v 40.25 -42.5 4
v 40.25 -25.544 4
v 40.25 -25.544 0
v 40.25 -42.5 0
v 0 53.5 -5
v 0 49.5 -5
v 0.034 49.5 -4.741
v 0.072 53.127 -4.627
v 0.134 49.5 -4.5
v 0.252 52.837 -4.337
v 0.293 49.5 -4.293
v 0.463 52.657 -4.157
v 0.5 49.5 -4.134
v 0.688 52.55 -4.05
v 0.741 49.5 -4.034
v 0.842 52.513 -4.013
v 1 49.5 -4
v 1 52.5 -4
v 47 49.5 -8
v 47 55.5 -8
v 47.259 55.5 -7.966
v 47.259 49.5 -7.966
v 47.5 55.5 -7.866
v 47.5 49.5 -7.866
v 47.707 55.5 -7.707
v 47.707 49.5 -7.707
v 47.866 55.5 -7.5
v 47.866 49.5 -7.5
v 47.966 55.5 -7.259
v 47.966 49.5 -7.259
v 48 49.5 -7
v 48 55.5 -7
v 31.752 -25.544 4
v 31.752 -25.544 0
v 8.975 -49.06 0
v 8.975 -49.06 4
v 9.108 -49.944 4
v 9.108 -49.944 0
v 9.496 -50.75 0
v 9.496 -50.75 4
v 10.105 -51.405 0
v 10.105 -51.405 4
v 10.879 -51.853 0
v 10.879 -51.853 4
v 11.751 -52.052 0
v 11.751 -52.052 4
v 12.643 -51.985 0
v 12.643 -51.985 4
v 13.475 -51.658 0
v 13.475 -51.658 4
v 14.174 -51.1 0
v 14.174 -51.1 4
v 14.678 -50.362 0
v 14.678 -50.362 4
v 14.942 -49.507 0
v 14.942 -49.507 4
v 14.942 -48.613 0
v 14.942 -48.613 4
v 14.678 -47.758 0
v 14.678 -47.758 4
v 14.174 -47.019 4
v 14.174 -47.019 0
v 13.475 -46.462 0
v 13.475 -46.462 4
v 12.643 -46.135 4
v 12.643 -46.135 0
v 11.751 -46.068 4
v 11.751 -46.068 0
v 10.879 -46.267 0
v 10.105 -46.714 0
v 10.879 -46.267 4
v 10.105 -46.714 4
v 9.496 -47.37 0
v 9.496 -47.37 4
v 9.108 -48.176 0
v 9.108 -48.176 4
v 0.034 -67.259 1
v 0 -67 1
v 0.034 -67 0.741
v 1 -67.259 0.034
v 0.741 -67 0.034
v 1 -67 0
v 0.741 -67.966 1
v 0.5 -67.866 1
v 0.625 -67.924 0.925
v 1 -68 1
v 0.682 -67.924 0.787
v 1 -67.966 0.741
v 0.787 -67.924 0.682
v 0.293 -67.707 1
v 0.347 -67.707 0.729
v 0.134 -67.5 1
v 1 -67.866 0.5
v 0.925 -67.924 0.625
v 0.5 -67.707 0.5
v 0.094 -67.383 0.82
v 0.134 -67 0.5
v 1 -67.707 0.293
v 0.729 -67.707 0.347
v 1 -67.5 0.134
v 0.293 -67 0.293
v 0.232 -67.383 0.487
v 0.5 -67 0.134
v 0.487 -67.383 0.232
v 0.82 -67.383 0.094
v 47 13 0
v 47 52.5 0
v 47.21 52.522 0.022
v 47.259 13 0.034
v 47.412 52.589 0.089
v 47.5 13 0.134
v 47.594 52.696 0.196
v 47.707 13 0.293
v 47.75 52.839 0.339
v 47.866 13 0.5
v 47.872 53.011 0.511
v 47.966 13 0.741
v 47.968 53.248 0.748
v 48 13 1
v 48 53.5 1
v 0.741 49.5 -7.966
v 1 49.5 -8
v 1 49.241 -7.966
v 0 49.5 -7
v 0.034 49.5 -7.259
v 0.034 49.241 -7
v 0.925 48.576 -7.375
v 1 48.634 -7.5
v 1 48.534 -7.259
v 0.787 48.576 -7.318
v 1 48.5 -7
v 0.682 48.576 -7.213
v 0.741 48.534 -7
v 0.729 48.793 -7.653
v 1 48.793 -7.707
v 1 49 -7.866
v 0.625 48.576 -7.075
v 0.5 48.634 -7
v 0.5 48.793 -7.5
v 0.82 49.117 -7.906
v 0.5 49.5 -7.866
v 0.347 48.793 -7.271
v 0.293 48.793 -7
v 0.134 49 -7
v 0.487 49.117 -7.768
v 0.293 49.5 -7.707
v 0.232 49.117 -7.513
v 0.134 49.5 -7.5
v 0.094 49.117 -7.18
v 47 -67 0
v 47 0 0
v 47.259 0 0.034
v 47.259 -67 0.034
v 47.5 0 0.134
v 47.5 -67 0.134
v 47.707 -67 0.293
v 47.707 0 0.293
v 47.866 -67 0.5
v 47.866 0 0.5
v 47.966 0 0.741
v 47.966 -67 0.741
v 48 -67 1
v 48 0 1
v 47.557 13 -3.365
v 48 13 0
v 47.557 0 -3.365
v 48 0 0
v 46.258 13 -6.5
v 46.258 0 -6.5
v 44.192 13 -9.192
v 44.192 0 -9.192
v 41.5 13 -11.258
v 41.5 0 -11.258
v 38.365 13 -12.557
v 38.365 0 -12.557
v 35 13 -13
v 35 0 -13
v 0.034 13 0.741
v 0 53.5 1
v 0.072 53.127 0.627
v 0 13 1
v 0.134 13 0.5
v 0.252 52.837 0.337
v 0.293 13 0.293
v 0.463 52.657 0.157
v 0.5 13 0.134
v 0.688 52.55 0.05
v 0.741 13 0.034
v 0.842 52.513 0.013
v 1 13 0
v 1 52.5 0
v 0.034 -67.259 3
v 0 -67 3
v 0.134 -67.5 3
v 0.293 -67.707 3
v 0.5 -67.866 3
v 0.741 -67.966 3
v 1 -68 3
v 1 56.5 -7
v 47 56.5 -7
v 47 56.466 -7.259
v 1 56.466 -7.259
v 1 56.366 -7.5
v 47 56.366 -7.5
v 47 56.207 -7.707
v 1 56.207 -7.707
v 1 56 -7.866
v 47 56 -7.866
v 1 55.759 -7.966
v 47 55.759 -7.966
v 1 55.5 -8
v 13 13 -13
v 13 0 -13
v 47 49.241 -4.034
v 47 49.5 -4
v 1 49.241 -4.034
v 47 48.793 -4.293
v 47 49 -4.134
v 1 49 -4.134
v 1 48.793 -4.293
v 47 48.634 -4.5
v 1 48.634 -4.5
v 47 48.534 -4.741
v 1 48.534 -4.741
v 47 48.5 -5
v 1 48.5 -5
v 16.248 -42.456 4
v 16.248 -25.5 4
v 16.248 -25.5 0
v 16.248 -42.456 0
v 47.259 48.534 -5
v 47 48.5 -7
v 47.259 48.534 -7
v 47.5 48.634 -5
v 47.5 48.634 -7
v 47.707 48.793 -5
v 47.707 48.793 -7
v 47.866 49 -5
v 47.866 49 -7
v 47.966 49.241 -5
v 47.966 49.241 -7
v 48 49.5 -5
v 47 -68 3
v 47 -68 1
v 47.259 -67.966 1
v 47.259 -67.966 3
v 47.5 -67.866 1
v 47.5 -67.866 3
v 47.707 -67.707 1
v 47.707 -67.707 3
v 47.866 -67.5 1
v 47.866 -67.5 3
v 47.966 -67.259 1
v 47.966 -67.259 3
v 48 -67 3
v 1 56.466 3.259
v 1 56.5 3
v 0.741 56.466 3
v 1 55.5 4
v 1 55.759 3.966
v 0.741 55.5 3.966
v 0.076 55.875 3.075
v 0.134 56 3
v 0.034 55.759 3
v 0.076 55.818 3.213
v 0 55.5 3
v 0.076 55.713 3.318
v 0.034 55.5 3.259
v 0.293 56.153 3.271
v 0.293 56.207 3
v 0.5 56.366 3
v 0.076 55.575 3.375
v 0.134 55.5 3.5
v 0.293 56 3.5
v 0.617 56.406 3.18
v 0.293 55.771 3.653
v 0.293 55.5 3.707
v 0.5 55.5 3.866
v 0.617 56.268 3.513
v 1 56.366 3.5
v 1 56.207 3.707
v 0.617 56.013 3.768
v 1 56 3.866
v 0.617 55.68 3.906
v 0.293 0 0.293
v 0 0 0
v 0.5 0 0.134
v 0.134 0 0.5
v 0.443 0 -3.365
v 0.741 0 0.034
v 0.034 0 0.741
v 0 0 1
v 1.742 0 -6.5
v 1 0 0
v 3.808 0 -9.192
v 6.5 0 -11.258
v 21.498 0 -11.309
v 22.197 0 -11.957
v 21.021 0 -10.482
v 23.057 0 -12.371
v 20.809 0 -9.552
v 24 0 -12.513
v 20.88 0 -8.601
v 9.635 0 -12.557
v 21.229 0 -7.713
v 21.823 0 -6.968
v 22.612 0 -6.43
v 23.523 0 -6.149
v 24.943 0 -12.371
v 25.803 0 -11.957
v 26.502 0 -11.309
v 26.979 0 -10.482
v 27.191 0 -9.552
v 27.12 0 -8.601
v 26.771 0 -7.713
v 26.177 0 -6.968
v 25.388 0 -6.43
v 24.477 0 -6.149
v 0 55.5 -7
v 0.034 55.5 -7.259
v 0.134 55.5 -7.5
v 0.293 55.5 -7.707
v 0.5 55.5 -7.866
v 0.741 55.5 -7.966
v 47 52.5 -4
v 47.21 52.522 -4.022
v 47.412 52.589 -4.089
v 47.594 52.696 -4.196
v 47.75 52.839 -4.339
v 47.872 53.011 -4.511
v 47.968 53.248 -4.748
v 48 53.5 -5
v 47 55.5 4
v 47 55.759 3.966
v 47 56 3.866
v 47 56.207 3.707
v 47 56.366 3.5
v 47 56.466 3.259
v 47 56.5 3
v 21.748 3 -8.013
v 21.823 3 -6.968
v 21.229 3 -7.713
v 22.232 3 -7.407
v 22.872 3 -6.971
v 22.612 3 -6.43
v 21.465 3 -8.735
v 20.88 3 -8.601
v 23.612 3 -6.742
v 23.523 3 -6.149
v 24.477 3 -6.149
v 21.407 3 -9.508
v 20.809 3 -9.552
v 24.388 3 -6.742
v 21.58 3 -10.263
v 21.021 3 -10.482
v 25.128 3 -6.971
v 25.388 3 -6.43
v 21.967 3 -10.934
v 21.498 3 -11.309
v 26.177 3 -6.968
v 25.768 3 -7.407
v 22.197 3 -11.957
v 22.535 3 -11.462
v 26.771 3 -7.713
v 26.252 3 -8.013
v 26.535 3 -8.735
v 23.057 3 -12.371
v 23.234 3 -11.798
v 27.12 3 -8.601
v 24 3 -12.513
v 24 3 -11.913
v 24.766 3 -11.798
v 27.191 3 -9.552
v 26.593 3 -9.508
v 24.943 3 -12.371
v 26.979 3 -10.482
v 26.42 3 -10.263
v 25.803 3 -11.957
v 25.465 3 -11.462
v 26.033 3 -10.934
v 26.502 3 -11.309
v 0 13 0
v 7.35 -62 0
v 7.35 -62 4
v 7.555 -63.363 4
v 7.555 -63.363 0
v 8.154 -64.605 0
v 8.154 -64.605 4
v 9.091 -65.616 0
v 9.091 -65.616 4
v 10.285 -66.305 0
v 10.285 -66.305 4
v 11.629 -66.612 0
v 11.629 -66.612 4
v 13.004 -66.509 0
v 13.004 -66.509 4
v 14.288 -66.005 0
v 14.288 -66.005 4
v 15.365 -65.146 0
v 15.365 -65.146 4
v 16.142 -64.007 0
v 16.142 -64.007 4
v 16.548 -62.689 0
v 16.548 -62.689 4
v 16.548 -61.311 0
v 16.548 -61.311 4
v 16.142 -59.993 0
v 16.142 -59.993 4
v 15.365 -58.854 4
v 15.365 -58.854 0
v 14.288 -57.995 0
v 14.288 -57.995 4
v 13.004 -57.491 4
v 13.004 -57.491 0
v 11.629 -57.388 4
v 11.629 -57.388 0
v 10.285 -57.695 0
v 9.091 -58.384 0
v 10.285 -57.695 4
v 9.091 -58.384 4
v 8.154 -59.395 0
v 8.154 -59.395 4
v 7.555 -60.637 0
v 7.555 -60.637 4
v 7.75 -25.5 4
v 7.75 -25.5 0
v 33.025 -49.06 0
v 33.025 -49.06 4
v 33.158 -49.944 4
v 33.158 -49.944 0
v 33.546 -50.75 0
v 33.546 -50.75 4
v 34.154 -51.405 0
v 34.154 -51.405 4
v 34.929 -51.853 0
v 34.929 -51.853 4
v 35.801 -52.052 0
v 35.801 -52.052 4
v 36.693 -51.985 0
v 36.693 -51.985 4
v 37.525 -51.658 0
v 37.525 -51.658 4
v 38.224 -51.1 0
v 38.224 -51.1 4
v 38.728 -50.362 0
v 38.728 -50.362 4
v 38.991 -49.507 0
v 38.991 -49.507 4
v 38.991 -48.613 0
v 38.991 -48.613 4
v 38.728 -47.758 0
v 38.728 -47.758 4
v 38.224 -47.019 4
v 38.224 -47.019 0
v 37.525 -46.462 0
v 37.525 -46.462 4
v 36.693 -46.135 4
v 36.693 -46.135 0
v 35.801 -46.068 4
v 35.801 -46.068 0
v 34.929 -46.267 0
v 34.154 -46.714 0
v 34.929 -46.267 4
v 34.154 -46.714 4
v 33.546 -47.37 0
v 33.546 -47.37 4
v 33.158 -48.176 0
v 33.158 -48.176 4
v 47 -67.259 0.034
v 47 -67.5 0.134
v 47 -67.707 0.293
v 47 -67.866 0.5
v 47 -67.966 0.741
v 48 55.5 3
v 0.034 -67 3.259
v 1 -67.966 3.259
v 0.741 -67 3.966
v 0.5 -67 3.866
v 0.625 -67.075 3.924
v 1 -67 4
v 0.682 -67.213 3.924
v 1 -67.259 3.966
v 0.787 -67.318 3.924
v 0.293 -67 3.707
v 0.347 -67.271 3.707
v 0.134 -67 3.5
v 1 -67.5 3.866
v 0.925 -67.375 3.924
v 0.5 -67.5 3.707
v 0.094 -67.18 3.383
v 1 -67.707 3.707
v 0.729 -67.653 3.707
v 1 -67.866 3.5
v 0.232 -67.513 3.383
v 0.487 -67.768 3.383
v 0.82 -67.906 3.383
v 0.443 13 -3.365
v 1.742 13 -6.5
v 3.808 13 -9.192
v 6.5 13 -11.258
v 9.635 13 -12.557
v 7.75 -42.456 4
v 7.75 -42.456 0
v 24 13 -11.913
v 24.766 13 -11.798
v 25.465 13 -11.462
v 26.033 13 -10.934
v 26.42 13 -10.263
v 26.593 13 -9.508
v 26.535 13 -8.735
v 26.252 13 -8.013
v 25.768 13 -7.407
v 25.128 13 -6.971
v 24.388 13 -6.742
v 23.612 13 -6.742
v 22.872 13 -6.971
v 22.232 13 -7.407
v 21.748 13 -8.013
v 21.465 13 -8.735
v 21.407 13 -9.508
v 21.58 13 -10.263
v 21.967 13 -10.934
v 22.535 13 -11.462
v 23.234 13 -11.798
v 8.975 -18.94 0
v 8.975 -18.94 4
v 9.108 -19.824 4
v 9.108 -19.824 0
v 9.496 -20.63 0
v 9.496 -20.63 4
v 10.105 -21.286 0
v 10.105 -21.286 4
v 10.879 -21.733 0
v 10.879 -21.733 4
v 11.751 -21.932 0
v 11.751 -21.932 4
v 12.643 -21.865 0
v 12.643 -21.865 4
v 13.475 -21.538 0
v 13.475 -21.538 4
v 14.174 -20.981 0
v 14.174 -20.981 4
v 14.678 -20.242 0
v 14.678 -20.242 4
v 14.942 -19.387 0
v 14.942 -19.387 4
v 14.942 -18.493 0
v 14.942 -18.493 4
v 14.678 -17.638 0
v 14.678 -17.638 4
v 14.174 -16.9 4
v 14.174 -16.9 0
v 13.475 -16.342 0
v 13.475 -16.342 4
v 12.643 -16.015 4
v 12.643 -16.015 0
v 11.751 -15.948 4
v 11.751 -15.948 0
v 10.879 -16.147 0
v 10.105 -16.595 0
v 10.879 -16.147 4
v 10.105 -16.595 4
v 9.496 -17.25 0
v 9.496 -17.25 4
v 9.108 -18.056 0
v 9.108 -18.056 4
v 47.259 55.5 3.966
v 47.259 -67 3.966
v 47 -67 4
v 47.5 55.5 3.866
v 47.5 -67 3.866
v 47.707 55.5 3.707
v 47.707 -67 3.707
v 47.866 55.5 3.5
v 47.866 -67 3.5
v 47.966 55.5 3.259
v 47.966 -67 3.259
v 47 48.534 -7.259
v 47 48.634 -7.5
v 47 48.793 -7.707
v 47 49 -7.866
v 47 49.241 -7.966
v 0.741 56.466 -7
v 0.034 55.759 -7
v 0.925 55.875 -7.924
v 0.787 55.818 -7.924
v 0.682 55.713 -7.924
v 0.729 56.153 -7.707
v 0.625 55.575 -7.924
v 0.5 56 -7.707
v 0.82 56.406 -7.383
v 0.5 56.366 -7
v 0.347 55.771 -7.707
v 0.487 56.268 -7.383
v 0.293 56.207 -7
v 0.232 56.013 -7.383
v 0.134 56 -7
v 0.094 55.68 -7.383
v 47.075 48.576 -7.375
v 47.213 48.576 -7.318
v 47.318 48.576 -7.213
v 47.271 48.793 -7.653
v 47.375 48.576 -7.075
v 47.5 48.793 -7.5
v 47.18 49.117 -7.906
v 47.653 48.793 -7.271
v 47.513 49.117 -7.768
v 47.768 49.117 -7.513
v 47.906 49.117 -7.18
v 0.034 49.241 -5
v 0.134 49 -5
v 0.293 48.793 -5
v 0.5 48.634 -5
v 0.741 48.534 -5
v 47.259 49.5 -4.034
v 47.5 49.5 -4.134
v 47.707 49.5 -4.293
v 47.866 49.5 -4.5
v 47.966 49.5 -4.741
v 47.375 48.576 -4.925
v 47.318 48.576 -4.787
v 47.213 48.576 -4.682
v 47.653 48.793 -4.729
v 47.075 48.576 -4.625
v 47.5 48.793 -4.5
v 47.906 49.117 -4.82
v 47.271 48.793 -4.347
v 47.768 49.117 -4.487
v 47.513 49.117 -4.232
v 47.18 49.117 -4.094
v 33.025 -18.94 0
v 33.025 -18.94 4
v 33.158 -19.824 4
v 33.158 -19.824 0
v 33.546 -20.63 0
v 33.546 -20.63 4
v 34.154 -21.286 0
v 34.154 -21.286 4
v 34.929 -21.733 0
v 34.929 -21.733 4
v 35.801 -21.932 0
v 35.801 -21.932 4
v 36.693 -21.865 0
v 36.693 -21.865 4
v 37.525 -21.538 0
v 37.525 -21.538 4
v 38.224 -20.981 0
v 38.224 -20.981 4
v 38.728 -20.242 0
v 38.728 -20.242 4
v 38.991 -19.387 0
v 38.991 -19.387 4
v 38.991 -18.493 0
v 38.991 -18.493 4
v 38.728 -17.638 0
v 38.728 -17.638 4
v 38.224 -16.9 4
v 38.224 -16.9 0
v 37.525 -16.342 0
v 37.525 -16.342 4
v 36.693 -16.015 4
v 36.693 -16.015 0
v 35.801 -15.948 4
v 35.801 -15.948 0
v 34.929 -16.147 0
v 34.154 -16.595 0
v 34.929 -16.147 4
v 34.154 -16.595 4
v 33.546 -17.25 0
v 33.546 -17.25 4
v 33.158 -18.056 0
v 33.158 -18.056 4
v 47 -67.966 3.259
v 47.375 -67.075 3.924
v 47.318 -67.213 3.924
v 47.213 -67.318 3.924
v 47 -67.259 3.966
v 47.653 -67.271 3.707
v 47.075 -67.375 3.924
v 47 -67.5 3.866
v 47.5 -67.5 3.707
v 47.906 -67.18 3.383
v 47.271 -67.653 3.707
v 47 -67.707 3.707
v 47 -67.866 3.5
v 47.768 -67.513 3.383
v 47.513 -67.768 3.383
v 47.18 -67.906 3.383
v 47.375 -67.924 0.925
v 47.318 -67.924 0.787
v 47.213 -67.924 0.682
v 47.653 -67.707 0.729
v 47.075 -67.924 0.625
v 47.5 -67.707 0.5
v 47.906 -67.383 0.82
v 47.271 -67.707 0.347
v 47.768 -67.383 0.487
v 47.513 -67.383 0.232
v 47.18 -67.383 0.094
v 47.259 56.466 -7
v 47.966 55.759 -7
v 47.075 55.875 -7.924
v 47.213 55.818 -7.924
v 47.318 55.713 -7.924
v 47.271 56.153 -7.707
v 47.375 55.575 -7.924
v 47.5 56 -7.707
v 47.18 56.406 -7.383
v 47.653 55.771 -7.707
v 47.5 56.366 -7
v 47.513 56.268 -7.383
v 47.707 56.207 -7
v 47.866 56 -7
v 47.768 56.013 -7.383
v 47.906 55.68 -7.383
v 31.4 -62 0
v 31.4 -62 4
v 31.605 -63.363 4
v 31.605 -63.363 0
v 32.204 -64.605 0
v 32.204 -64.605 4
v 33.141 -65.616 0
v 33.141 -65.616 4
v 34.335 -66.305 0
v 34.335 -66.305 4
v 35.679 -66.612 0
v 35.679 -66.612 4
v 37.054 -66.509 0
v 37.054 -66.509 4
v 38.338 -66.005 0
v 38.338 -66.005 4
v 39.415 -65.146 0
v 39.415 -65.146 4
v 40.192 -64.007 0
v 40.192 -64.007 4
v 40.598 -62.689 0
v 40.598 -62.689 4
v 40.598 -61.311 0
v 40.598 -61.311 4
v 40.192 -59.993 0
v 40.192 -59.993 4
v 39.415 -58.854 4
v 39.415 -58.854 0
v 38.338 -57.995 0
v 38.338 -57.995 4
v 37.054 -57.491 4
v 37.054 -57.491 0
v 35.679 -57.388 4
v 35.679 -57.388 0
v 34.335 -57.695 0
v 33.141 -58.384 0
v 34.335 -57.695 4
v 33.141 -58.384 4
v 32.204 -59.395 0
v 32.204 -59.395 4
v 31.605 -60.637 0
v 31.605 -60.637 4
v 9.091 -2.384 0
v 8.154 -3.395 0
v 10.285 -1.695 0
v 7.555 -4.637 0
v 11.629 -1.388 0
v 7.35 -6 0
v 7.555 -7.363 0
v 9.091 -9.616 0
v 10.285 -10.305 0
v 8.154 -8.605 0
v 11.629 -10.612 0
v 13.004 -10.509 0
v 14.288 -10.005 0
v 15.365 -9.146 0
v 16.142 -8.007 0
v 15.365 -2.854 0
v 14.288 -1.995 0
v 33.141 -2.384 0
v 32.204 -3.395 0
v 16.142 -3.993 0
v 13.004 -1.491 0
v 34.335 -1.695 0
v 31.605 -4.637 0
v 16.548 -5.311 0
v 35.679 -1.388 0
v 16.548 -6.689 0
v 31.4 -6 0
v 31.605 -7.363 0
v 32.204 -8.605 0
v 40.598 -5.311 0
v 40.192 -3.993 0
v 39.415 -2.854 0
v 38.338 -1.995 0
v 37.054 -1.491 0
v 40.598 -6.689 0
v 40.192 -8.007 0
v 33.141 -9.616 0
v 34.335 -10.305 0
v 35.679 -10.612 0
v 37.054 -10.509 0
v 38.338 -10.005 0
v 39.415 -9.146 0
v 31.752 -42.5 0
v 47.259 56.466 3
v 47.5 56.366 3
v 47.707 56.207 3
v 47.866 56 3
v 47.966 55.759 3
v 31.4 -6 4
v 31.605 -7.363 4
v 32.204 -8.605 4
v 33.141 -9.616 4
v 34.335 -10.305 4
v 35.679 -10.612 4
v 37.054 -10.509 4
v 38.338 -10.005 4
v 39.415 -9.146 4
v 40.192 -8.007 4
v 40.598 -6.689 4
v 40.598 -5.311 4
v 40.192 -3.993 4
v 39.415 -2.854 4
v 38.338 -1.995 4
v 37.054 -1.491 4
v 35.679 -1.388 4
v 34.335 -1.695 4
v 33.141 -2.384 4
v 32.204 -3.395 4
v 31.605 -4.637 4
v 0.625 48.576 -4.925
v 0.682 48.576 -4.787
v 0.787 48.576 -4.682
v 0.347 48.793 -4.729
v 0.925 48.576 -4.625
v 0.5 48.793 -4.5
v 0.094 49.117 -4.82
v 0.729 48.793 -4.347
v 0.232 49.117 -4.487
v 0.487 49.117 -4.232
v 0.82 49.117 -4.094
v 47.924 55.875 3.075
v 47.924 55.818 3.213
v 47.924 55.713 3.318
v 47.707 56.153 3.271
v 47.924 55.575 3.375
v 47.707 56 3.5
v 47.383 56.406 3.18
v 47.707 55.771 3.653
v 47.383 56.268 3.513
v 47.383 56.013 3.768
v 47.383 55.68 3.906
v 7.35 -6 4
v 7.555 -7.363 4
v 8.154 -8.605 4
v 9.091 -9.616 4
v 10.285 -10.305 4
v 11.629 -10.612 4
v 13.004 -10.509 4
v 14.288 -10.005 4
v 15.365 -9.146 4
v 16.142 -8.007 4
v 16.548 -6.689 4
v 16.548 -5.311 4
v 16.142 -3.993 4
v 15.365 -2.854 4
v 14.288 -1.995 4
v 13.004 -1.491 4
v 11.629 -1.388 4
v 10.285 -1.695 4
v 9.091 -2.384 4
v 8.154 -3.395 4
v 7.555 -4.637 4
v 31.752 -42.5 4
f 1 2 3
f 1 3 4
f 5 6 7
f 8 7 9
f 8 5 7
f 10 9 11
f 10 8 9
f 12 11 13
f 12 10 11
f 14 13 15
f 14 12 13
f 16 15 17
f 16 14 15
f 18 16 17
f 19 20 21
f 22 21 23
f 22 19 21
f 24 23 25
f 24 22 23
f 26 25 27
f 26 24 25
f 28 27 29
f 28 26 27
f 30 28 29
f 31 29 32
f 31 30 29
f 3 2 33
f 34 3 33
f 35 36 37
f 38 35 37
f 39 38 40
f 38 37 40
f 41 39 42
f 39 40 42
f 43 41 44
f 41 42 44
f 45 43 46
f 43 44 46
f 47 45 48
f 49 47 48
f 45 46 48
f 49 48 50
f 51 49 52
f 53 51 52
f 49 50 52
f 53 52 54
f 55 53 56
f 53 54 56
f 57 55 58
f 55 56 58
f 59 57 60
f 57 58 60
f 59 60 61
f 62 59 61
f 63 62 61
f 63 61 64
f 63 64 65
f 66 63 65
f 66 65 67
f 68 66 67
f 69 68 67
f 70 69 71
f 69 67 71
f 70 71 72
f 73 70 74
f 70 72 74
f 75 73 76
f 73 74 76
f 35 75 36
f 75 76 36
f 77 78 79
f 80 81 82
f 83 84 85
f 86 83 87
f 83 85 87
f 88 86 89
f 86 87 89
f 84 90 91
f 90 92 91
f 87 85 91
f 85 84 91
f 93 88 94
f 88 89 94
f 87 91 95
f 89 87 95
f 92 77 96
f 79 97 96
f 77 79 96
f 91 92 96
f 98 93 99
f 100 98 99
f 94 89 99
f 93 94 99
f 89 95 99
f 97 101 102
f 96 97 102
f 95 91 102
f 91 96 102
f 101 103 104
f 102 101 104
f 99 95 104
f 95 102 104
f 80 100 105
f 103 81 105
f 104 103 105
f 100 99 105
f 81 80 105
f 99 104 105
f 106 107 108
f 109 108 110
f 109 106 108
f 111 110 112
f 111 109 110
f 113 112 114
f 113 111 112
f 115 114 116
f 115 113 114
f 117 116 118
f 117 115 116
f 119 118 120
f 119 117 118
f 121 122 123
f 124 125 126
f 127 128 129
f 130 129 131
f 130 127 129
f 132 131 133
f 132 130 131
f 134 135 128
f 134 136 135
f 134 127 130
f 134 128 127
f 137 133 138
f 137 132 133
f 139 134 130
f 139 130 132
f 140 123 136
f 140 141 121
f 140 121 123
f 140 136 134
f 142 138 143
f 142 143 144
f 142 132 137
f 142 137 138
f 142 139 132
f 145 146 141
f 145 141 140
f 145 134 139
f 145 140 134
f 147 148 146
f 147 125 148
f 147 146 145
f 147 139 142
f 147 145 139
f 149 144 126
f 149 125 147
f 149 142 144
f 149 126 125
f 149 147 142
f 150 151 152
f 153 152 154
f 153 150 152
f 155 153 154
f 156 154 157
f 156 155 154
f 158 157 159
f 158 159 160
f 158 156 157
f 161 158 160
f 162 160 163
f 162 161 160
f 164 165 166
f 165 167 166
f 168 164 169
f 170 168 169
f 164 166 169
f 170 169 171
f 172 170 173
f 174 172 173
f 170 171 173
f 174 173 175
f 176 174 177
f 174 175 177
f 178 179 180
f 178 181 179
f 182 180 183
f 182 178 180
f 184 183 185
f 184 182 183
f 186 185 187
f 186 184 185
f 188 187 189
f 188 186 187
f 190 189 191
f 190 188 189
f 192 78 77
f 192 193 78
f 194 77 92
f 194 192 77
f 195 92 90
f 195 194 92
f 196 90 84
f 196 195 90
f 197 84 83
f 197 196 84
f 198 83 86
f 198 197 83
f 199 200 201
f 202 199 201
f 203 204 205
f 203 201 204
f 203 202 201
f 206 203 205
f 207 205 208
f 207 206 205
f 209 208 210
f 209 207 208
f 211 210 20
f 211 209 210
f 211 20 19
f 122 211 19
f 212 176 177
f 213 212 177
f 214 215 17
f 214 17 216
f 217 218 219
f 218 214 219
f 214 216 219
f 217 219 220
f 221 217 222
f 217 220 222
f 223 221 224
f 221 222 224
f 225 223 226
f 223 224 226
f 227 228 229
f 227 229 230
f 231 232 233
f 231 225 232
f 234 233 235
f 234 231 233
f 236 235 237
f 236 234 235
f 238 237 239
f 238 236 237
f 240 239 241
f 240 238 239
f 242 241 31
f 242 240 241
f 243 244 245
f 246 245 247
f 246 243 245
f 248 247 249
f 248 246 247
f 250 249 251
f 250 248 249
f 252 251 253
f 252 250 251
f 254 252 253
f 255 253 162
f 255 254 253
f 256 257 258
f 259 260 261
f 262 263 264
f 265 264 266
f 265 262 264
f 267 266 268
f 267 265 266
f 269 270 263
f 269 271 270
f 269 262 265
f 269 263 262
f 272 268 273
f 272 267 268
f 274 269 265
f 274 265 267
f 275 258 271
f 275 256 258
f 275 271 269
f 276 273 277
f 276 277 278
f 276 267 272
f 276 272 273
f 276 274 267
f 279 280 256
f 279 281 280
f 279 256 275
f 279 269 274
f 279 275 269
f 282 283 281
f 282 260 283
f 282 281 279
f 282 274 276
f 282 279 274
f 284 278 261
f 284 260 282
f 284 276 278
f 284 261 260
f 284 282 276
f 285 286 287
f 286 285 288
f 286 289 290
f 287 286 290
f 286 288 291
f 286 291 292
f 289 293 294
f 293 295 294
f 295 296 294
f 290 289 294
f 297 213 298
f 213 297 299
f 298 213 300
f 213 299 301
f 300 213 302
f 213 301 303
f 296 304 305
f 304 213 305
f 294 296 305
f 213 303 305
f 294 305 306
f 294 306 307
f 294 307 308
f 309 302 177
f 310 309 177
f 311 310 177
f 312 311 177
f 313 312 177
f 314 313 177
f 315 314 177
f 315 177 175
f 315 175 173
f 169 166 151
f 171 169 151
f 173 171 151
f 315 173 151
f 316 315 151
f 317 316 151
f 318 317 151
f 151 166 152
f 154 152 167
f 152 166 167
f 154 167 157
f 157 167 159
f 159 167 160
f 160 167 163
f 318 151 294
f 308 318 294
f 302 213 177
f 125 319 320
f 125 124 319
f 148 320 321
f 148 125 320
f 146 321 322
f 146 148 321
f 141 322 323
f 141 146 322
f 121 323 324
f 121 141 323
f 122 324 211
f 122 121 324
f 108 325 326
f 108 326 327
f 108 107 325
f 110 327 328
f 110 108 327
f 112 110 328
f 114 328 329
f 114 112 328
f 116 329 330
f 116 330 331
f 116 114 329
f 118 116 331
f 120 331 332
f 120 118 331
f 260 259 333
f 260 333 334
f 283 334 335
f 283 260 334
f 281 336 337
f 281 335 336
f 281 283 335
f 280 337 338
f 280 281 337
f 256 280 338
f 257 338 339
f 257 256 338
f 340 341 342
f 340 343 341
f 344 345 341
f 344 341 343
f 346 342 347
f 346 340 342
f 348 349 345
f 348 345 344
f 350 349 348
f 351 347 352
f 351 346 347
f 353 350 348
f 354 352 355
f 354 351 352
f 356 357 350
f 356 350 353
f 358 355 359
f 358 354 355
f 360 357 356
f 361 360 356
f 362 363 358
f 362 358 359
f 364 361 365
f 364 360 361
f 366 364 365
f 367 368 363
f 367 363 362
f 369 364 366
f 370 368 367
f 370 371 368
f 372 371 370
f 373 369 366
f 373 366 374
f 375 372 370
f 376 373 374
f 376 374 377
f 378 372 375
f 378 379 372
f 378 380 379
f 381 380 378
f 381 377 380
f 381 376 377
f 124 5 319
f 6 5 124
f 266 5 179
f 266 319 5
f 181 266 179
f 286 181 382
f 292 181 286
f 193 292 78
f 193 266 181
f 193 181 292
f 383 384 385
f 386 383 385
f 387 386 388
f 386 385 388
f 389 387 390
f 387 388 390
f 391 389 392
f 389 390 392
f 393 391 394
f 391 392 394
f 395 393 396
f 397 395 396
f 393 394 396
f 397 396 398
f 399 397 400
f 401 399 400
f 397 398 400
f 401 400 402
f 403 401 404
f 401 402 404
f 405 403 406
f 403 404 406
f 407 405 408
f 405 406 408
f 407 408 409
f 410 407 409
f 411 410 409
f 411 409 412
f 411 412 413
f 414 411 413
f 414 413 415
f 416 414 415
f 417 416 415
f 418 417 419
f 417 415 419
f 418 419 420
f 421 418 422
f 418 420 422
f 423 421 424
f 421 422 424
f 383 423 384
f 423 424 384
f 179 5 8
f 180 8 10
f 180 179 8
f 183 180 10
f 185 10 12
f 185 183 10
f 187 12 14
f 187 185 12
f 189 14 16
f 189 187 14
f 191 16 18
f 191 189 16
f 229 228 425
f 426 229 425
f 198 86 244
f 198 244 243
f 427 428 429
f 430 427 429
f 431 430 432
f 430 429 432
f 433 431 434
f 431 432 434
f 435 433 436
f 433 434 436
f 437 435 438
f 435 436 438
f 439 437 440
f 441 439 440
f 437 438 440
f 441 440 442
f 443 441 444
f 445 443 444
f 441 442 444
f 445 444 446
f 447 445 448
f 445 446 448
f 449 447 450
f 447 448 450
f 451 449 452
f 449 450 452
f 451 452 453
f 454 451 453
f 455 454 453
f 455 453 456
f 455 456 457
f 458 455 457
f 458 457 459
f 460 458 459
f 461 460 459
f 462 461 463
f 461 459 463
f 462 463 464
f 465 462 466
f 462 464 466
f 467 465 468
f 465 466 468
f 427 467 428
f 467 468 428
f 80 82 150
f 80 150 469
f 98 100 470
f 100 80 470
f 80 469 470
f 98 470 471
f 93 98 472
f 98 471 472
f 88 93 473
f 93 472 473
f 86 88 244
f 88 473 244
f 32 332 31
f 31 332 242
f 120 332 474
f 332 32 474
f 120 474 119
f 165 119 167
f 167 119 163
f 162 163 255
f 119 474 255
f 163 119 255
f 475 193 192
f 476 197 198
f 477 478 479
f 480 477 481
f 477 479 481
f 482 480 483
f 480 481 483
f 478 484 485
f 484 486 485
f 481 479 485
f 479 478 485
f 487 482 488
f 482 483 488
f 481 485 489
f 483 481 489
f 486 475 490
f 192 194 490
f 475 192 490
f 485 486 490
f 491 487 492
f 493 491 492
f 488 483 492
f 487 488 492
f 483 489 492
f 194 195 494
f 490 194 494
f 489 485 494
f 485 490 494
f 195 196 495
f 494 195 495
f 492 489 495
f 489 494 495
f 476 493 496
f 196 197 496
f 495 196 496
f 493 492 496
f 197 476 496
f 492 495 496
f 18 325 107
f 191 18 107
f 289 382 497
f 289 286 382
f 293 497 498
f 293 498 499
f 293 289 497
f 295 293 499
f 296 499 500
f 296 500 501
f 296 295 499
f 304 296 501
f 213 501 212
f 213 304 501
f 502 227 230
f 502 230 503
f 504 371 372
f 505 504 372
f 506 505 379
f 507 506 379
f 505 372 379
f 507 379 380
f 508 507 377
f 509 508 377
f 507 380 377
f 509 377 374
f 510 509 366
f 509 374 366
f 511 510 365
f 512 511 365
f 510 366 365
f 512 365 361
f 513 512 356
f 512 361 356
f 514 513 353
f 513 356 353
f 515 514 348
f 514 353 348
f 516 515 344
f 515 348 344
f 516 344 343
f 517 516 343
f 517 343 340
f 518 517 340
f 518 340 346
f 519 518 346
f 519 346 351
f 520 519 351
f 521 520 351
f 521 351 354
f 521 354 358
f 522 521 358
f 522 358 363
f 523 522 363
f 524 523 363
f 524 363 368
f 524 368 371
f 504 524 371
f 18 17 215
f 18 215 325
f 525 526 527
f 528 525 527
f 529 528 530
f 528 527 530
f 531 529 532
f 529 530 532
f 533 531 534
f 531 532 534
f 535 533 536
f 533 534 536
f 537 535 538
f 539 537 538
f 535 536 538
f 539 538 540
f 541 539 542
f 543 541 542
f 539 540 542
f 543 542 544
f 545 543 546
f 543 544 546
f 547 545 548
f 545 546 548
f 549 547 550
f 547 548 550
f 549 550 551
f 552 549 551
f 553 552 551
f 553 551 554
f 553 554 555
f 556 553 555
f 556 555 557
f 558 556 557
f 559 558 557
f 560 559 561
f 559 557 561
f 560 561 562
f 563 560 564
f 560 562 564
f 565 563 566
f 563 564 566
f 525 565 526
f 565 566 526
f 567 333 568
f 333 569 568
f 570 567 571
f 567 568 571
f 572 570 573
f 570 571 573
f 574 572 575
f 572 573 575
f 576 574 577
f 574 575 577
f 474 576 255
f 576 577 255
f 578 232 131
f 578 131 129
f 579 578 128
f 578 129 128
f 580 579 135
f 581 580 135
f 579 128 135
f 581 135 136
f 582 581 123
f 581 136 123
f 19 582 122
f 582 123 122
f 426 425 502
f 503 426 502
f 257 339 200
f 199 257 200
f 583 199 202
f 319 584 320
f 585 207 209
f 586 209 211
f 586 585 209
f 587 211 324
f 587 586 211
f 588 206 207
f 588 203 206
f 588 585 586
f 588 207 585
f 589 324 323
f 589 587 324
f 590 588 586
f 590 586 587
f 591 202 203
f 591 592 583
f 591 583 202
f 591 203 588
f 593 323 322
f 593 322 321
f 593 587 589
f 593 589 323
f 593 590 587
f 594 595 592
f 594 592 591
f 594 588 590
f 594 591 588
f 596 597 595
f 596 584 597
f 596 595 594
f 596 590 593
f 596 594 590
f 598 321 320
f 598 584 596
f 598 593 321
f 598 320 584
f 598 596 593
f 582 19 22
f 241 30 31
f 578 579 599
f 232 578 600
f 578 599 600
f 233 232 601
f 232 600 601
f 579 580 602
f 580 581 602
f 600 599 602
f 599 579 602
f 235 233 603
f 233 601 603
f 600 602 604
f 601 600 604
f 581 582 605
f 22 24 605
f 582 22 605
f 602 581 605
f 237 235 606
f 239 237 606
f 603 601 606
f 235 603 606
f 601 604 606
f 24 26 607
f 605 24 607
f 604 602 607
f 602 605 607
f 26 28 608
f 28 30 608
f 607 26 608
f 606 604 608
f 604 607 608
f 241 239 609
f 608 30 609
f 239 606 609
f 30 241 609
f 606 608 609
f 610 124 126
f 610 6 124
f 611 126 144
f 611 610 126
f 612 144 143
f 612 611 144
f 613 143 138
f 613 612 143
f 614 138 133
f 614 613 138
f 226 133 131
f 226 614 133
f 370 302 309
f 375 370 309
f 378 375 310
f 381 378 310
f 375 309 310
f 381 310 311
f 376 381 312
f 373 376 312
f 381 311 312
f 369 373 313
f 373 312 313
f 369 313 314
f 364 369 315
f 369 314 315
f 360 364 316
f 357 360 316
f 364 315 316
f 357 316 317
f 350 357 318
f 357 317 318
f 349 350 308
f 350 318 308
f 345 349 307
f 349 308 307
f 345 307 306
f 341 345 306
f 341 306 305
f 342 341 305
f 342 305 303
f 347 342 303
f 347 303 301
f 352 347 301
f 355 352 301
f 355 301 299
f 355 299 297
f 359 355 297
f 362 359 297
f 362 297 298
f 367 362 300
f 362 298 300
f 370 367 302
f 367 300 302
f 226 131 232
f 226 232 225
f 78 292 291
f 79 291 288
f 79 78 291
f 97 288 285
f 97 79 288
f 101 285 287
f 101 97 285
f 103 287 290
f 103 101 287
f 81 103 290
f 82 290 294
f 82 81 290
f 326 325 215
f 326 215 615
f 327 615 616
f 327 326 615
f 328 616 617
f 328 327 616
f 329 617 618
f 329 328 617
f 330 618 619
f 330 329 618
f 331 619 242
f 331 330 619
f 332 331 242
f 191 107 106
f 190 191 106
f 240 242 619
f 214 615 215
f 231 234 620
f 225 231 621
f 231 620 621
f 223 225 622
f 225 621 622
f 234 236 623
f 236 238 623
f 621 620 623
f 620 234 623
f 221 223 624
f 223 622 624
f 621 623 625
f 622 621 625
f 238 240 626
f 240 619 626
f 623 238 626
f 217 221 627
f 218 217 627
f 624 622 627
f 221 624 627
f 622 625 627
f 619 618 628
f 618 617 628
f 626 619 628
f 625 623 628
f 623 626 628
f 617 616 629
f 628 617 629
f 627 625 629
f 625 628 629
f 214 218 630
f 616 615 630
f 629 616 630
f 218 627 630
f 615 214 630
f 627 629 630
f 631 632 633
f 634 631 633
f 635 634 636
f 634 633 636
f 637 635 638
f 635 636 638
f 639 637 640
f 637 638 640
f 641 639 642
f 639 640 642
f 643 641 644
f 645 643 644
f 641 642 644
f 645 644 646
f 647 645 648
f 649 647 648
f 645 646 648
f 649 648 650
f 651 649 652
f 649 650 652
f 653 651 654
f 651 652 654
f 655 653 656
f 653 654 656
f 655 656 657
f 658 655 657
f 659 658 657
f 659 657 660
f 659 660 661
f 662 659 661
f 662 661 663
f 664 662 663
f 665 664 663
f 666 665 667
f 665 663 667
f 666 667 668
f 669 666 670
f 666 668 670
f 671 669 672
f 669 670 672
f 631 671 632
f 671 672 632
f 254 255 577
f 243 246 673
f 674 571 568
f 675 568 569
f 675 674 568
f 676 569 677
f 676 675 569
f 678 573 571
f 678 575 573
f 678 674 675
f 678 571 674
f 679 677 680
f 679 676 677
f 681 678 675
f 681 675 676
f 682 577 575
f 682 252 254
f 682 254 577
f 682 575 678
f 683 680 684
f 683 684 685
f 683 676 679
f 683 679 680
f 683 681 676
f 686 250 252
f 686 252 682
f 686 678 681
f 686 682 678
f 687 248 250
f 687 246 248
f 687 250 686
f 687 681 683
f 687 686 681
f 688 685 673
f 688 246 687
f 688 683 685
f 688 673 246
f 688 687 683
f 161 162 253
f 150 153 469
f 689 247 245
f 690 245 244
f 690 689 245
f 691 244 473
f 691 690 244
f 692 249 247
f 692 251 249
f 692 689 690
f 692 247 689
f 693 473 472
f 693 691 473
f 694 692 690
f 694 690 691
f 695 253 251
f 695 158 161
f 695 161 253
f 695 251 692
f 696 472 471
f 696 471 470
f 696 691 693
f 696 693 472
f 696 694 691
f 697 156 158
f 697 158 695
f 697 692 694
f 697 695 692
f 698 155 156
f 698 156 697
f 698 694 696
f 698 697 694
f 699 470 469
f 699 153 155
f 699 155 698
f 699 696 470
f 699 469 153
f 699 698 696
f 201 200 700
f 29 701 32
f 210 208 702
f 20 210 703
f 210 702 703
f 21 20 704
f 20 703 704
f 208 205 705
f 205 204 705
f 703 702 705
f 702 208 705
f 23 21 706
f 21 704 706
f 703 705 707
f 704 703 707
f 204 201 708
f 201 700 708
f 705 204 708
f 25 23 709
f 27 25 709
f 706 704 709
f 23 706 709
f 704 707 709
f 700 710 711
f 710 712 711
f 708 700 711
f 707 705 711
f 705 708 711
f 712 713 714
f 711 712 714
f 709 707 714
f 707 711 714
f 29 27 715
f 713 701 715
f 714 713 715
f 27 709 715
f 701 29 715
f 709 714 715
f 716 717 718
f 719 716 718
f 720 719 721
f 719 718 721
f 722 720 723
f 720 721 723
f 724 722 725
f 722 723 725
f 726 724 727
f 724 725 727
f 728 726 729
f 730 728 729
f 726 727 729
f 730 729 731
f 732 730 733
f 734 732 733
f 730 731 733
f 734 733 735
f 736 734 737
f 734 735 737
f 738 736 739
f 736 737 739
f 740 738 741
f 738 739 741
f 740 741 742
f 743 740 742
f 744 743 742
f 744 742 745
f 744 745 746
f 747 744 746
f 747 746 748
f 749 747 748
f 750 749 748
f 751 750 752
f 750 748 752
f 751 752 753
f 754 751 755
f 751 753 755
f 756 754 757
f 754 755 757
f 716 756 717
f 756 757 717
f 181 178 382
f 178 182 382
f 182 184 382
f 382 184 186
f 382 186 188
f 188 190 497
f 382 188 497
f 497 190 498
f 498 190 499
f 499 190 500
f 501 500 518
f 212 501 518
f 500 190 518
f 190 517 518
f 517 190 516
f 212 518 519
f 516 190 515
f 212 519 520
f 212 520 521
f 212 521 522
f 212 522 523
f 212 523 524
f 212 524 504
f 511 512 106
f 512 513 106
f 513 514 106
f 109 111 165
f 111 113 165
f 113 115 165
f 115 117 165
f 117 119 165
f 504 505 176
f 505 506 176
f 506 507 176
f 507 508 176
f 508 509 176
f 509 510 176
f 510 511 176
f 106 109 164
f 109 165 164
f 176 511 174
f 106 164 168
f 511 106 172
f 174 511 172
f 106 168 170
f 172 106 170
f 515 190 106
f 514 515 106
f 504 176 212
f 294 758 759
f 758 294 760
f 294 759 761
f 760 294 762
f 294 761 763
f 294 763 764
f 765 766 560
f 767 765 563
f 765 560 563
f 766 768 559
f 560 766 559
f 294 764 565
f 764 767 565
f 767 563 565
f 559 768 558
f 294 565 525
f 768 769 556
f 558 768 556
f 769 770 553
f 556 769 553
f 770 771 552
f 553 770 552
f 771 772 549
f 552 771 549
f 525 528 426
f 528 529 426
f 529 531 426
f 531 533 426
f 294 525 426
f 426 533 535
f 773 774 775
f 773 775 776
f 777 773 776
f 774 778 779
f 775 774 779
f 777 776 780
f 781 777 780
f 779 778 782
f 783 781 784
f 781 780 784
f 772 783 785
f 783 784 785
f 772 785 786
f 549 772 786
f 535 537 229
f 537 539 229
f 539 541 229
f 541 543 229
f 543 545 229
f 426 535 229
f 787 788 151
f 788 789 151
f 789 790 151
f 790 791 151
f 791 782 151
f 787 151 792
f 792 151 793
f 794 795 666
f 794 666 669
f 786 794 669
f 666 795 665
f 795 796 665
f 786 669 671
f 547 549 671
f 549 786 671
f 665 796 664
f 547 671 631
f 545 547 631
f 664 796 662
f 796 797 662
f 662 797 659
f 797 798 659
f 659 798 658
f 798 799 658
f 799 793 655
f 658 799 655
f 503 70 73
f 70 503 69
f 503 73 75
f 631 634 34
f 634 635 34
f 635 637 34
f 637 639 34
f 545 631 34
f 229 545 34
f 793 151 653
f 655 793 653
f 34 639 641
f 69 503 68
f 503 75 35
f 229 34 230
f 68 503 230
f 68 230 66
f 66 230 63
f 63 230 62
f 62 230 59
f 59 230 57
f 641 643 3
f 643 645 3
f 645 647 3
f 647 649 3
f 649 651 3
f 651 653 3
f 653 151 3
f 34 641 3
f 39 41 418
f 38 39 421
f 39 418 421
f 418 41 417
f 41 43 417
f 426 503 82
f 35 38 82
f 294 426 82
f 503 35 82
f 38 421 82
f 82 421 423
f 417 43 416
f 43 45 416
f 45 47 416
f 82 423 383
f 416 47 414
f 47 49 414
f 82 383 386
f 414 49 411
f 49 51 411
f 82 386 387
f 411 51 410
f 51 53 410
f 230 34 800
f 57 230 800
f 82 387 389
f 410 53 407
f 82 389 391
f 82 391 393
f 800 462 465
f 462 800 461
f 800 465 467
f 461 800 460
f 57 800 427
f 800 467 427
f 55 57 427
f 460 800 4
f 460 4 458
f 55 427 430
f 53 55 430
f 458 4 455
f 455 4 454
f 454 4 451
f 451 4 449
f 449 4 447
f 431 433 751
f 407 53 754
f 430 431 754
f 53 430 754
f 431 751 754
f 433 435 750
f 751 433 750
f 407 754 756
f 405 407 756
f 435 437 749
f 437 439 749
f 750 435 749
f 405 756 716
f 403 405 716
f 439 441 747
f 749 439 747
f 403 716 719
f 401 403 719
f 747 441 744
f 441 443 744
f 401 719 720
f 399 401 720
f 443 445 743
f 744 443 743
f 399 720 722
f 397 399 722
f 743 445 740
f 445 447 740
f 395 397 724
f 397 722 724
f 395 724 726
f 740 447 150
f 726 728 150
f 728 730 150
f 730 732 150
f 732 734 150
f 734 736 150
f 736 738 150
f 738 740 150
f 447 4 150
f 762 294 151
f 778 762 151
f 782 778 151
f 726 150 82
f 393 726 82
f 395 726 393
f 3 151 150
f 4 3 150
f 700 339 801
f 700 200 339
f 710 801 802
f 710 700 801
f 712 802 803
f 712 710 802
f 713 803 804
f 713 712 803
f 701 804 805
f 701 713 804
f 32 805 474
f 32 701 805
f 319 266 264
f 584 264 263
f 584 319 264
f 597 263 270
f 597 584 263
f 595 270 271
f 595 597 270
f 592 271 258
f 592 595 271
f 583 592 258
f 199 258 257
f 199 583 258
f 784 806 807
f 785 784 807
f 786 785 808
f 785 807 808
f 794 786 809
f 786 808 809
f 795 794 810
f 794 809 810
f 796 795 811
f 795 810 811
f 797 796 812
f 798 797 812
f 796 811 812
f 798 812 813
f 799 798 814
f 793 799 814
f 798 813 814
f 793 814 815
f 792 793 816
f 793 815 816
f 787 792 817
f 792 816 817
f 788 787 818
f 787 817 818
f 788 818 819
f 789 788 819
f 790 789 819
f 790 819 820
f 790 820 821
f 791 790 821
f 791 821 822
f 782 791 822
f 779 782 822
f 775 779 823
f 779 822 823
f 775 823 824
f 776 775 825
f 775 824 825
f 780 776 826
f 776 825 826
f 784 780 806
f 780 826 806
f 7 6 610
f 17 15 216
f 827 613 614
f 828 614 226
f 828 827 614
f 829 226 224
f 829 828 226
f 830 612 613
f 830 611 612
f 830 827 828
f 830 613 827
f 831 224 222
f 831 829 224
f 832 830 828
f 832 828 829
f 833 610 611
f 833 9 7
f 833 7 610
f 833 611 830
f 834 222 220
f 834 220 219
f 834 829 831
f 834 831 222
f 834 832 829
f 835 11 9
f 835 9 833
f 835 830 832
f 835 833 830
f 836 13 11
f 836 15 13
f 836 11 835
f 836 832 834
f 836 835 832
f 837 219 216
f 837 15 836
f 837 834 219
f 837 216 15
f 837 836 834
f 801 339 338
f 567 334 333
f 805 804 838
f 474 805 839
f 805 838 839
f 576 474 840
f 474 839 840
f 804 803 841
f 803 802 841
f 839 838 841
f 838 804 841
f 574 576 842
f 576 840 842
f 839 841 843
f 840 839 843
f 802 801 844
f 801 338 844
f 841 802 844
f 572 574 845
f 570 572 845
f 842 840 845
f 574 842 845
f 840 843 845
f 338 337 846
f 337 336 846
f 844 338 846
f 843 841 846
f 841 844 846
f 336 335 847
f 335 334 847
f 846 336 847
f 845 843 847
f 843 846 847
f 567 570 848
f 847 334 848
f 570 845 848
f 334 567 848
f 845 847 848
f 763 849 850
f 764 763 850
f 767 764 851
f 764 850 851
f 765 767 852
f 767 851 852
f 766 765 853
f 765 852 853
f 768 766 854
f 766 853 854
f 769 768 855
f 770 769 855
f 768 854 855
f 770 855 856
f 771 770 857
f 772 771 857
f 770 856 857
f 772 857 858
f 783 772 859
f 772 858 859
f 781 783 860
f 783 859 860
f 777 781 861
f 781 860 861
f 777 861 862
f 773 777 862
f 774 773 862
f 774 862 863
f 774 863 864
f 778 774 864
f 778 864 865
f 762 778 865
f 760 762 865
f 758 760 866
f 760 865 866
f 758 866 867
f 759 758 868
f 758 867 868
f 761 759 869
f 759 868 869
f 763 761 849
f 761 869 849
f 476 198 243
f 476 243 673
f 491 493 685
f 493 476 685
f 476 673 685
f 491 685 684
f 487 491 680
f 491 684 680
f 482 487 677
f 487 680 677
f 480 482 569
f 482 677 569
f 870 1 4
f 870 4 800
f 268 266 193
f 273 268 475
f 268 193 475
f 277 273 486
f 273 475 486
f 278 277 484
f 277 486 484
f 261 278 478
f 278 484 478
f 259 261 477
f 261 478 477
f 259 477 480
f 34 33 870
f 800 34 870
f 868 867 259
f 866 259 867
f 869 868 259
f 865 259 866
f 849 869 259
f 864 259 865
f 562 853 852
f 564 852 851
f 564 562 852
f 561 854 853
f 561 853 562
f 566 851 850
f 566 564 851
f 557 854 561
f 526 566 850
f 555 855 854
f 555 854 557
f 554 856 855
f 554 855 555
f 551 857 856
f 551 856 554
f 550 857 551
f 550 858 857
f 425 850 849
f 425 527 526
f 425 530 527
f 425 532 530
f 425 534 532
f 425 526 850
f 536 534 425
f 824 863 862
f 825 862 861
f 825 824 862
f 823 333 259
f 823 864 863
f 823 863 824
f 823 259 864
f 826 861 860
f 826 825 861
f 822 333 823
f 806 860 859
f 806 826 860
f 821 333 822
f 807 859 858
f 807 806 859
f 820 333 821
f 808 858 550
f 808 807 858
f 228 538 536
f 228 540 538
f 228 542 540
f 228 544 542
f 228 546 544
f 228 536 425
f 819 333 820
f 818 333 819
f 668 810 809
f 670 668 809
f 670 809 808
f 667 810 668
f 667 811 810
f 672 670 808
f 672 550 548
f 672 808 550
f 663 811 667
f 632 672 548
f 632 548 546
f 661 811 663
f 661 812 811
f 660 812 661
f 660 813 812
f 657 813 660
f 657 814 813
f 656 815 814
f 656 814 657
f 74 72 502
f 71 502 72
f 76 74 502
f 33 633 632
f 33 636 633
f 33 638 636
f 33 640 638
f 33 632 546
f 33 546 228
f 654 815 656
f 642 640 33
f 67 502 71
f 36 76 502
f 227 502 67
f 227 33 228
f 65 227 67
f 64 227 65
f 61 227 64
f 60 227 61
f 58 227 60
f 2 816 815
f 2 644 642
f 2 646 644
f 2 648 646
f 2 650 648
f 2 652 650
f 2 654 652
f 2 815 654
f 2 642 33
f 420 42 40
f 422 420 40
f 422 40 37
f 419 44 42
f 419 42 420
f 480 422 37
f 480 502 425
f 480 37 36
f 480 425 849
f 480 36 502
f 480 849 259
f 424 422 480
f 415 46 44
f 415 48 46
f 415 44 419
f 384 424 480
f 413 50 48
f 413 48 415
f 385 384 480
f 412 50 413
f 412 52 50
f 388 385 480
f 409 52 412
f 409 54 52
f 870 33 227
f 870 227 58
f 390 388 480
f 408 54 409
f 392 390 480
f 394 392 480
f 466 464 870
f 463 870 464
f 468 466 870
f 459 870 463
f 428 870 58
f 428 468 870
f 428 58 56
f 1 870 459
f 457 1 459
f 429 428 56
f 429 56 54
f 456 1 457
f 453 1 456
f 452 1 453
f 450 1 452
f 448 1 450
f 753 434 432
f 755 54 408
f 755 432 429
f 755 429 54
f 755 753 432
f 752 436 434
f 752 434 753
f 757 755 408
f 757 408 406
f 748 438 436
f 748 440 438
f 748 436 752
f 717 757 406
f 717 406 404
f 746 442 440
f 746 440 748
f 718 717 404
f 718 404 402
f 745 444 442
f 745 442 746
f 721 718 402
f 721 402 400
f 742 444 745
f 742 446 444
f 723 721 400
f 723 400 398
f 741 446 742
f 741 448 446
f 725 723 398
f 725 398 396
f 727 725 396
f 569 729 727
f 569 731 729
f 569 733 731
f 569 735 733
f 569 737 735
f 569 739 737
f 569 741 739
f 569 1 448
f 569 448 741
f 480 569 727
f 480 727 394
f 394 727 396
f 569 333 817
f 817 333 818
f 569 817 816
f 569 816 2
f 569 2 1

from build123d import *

# Parameters (mm, degrees)
PAD_DEPTH       = 24
SKETCH_R        = 4.625
SKETCH_R_2      = 3
SKETCH_W        = 8.497862
SKETCH_H        = 16.9564
POCKET_DEPTH    = 4
SKETCH003_R     = 2.6
POCKET001_DEPTH = 13
FILLET_R        = 13
FILLET001_R     = 1
SKETCH004_R     = 3.2
POCKET002_DEPTH = 3


with BuildPart() as part:
    # Sketch002 → Pad (new body, symmetric)
    with BuildSketch(Plane.YZ.offset(24)):
        Polygon((0, 4), (56.5, 4), (56.5, -8), (48.5, -8), (48.5, -4), (52.5, -4), (52.5, 0), (13, 0), (13, -13), (0, -13), (0, 0), (-68, 0), (-68, 4), align=None)
    extrude(amount=PAD_DEPTH, both=True)

    # Sketch (on Face13 of Pad) → Pocket (cut)
    with BuildSketch(Plane(origin=(24, -34, 4), x_dir=(-1, 0, 0), z_dir=(0, 0, 1))):
        with Locations((-12.025, 28)):
            Circle(SKETCH_R)
        with Locations((12.025, 28)):
            Circle(SKETCH_R)
        with Locations((12.025, -28)):
            Circle(SKETCH_R)
        with Locations((-12.025, -28)):
            Circle(SKETCH_R)
        with Locations((-12.024955, 15.059916)):
            Circle(SKETCH_R_2)
        with Locations((12.024955, 15.059916)):
            Circle(SKETCH_R_2)
        with Locations((12.024955, -15.059916)):
            Circle(SKETCH_R_2)
        with Locations((-12.024955, -15.059916)):
            Circle(SKETCH_R_2)
        with Locations((-12.001069, 0.0218)):
            Rectangle(SKETCH_W, SKETCH_H)
        with Locations((12.001069, -0.0218)):
            Rectangle(SKETCH_W, SKETCH_H)
    extrude(amount=-POCKET_DEPTH, mode=Mode.SUBTRACT)

    # Sketch003 (on Face30 of Pocket) → Pocket001 (cut)
    with BuildSketch(Plane(origin=(24, 0, 0), x_dir=(0, 0, -1), z_dir=(0, -1, 0))):
        with Locations((9.313336, 0)):
            Circle(SKETCH003_R)
    extrude(amount=-POCKET001_DEPTH, mode=Mode.SUBTRACT)

    # Fillet
    fillet_edges = [part.edges().sort_by_distance(p)[0] for p in [
        (48, 6.5, -13),
        (0, 6.5, -13),
    ]]
    fillet(fillet_edges, radius=FILLET_R)

    # Fillet001
    fillet001_edges = [part.edges().sort_by_distance(p)[0] for p in [
        (24, 56.5, 4),
        (0, 56.5, -2),
        (48, 56.5, -2),
        (24, 56.5, -8),
        (0, 52.5, -8),
        (48, 52.5, -8),
        (24, 48.5, -8),
        (0, 6.5, 0),
        (0, 32.75, 0),
        (0, -34, 0),
        (0, 52.5, -2),
        (0, -68, 2),
        (0, 50.5, -4),
        (0, -34, 4),
        (0, 48.5, -6),
        (0, 28.25, 4),
        (48, 6.5, 0),
        (48, 32.75, 0),
        (48, -34, 0),
        (48, 52.5, -2),
        (48, -68, 2),
        (48, 50.5, -4),
        (48, -34, 4),
        (48, 48.5, -6),
        (48, 28.25, 4),
        (24, -68, 4),
        (24, -68, 0),
        (24, 48.5, -4),
    ]]
    fillet(fillet001_edges, radius=FILLET001_R)

    # Sketch004 (on Face5 of Fillet001) → Pocket002 (cut)
    with BuildSketch(Plane(origin=(24, 0, 0), x_dir=(0, 0, -1), z_dir=(0, -1, 0))):
        with Locations((9.313336, 0)):
            Circle(SKETCH004_R)
    extrude(amount=-POCKET002_DEPTH, mode=Mode.SUBTRACT)


solid = part.part
